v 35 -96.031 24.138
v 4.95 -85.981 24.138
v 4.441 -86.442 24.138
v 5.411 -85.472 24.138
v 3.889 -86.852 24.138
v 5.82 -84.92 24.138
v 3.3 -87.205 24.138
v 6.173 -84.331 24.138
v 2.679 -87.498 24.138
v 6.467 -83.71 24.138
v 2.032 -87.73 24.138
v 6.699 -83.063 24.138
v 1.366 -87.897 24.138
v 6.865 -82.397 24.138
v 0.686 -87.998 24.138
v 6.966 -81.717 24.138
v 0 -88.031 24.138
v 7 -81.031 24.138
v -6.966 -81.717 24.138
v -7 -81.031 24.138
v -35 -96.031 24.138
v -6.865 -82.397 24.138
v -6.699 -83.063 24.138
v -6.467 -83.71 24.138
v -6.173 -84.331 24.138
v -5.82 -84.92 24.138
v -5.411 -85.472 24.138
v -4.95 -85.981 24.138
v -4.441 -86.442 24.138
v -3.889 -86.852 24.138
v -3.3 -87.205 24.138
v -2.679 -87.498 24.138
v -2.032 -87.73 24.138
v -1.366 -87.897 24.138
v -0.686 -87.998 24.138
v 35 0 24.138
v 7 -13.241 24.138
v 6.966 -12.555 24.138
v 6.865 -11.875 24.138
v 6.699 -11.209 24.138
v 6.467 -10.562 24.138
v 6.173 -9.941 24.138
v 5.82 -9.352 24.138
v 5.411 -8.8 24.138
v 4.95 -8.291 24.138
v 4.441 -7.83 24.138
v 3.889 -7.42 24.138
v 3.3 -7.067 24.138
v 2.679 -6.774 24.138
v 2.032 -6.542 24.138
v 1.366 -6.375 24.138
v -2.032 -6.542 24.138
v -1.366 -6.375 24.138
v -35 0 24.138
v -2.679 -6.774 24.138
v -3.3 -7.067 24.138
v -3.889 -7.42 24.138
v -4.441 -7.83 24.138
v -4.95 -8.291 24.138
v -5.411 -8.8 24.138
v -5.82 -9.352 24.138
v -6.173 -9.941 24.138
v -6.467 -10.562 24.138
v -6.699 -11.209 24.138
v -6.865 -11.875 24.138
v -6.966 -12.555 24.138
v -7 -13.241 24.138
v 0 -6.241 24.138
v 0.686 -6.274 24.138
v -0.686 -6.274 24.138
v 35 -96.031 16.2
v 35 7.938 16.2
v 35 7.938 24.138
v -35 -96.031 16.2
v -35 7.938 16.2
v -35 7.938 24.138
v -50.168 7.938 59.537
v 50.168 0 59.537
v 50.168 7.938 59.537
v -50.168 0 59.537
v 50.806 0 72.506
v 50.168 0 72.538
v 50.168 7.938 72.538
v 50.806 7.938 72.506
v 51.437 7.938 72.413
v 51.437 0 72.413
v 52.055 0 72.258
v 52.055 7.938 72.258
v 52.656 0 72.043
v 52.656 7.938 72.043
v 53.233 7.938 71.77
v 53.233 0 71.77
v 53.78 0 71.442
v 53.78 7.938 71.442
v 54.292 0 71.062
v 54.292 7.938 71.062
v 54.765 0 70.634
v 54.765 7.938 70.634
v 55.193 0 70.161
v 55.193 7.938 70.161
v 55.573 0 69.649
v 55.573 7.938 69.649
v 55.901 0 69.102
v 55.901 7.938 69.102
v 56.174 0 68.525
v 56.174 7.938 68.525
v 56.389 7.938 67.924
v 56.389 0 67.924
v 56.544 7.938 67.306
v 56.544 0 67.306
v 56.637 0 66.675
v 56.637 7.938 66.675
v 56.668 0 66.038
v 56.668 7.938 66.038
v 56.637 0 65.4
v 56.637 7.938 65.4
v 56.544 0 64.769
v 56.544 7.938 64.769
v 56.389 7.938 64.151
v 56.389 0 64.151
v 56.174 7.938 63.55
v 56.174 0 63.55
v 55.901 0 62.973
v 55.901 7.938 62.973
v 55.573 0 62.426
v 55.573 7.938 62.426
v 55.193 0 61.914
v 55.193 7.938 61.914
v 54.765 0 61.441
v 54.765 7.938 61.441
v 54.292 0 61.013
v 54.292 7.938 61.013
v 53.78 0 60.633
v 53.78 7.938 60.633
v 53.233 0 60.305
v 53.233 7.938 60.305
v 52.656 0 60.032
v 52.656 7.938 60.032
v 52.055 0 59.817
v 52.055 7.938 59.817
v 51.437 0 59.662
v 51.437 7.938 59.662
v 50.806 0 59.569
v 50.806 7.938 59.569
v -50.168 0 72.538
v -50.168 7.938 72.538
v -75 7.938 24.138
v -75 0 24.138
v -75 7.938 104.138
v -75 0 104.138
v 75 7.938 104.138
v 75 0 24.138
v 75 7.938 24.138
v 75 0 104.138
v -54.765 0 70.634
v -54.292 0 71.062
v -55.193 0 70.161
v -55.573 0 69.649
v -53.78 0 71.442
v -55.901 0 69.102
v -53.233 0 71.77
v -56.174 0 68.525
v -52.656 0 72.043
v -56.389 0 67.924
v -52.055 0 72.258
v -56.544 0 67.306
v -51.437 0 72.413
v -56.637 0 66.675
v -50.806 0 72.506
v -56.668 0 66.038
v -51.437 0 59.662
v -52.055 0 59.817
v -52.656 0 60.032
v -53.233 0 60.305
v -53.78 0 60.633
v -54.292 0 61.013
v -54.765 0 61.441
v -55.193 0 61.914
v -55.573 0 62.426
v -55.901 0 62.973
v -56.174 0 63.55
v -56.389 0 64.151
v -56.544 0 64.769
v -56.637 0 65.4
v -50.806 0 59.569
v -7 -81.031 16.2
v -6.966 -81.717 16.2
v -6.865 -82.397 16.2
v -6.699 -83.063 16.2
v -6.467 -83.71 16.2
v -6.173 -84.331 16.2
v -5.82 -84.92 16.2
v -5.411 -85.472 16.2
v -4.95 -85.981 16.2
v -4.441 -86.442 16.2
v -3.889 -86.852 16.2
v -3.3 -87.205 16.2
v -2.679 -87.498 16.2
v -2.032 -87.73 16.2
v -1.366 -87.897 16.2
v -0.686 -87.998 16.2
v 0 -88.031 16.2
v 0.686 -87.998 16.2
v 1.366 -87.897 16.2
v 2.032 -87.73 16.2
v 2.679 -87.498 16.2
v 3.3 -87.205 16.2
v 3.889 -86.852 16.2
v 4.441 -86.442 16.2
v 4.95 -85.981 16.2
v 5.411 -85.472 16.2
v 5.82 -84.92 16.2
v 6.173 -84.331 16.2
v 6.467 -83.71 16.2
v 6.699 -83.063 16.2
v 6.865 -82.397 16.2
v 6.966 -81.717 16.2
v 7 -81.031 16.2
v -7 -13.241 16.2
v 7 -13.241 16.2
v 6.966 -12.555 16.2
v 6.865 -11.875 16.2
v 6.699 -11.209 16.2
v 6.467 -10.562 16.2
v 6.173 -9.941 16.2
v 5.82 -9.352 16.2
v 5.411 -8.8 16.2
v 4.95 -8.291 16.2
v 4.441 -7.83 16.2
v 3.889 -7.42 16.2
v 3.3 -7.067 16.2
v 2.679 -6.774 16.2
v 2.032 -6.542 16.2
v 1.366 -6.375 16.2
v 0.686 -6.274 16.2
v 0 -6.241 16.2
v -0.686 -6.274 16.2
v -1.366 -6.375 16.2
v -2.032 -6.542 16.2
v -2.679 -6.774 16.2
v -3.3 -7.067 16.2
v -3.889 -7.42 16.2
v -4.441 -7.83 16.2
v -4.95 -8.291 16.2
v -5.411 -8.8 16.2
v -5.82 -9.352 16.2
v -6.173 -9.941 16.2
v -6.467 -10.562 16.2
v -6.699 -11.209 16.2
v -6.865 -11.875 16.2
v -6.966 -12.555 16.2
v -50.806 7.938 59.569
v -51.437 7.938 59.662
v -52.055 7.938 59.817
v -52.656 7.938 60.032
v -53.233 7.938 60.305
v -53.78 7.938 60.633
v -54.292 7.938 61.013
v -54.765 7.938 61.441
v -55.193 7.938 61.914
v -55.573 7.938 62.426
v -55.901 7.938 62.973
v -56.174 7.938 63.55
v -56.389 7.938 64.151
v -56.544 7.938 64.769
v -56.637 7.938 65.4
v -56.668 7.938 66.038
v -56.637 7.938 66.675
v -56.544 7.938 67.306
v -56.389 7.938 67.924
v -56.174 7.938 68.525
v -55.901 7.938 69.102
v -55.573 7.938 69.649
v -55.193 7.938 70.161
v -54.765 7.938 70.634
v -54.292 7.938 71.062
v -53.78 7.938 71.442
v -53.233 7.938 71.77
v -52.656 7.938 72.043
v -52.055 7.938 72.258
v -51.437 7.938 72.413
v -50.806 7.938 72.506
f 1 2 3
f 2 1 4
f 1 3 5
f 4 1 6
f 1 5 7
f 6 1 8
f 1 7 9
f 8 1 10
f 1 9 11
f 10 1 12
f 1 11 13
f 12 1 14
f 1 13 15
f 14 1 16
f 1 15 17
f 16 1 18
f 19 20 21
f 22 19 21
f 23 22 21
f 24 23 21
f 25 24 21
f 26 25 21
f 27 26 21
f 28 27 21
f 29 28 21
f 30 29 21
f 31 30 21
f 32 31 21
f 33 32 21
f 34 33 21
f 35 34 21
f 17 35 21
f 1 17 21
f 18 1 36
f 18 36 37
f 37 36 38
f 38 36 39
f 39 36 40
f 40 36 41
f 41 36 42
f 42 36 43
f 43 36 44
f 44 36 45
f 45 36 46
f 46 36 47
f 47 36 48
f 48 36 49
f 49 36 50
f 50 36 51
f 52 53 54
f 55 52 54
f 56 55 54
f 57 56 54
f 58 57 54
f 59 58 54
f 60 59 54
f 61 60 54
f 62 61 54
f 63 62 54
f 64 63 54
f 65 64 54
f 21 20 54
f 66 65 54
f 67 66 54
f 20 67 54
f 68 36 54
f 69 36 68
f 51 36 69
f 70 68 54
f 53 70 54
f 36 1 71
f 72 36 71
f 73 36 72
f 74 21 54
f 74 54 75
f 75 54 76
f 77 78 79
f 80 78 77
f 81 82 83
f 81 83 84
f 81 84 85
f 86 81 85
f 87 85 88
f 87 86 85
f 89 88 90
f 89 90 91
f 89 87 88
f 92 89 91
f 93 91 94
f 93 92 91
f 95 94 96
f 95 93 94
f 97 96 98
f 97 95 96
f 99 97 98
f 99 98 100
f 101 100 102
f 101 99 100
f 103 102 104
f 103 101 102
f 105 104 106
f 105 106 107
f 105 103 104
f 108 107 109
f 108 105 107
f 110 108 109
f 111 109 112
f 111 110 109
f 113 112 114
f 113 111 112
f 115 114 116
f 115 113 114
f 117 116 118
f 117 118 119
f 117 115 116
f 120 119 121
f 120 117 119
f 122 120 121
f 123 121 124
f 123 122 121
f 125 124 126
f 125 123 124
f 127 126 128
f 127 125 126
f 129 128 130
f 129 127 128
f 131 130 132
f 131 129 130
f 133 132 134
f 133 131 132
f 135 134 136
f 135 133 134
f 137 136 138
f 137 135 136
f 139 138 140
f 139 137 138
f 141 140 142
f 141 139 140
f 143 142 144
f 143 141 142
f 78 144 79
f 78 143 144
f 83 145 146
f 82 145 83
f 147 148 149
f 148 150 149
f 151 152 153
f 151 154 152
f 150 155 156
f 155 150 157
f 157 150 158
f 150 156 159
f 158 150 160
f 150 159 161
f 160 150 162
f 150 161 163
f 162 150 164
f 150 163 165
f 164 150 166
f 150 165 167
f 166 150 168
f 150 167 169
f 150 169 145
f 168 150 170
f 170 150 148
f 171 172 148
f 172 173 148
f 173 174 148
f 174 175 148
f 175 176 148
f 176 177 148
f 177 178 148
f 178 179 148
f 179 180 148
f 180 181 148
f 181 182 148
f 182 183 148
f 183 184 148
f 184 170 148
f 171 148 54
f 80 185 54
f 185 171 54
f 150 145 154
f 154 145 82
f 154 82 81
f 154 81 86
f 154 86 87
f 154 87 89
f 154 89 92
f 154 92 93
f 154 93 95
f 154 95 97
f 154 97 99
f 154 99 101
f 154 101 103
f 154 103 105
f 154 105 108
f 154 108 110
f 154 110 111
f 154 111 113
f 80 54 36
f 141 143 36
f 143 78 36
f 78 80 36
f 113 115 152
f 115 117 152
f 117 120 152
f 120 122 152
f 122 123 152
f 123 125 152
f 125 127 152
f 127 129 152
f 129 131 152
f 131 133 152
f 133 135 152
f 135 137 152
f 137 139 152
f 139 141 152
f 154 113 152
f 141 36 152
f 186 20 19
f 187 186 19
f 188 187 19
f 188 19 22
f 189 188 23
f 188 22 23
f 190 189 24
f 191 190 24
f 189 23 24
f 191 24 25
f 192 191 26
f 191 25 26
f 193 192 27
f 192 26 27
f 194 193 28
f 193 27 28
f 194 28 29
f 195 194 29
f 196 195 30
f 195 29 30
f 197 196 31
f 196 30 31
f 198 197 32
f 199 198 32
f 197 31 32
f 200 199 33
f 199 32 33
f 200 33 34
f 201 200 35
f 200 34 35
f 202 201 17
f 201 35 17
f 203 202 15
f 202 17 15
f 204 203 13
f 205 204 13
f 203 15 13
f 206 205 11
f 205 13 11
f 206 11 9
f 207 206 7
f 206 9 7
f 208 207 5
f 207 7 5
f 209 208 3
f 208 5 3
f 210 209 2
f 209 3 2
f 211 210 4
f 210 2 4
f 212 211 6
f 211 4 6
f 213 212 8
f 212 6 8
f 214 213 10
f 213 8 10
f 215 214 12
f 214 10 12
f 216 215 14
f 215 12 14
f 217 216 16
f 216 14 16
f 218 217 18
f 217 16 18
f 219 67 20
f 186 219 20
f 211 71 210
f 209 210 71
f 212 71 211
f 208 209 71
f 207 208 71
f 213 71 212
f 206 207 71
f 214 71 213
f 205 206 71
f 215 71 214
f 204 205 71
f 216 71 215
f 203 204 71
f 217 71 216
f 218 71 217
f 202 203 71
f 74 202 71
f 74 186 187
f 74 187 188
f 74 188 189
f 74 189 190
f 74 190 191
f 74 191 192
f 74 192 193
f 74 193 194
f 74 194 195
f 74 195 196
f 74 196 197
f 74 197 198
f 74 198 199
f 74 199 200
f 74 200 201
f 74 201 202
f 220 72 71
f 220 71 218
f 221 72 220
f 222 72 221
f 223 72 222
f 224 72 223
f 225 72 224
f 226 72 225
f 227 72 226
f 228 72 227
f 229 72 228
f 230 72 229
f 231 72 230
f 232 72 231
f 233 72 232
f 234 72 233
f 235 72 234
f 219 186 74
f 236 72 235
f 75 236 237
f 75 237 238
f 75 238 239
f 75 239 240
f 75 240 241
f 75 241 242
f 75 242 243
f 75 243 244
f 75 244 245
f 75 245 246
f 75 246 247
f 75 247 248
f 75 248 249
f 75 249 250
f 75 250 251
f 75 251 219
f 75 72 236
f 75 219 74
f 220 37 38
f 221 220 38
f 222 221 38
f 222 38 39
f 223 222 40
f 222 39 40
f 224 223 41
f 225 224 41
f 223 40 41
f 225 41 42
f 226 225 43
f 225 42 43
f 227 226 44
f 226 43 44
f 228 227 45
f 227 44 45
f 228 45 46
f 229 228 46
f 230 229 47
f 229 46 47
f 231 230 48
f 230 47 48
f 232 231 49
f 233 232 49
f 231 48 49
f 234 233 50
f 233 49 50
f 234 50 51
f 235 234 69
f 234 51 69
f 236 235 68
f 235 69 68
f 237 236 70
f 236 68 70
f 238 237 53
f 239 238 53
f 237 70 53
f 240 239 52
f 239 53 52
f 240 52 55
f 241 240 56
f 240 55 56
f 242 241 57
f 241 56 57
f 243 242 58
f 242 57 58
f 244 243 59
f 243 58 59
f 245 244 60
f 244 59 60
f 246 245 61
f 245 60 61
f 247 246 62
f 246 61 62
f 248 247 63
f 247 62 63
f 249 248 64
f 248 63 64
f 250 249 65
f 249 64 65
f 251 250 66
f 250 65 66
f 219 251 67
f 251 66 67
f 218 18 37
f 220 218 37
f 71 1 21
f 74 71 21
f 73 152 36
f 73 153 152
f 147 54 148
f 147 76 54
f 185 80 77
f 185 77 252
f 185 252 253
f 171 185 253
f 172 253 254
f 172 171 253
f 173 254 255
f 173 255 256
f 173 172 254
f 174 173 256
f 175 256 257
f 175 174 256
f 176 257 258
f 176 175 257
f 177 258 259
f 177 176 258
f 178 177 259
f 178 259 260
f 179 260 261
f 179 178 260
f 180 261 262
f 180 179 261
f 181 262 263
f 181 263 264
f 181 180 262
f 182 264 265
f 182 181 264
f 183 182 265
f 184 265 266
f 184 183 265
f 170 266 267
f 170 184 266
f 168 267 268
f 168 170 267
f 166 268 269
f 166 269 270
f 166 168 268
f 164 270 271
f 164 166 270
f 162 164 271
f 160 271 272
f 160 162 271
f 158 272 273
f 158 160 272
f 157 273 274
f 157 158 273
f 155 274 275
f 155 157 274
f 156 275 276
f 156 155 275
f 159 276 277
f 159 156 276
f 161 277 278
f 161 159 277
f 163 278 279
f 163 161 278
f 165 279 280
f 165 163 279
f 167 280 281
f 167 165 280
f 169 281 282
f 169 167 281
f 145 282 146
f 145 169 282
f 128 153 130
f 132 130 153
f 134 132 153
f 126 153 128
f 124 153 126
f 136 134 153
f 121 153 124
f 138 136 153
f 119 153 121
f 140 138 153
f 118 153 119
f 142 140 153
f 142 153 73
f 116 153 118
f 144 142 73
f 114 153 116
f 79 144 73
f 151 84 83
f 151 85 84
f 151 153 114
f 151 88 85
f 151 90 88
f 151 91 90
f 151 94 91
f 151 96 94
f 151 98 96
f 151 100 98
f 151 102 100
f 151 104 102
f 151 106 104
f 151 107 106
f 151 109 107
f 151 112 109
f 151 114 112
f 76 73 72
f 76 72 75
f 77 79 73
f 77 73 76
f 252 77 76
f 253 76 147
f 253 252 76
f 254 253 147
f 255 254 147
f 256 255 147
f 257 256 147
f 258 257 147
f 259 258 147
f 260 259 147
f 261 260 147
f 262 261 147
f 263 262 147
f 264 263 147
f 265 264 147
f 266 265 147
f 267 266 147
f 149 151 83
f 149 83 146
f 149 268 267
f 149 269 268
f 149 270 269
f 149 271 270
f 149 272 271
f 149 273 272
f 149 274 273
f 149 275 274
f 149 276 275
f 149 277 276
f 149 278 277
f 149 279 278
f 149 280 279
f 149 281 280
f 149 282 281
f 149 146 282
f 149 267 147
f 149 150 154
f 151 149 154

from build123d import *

# Parameters (mm, degrees)
CROQUIS1_R                 = 6.35
CROQUIS1_R_2               = 6.26
CROQUIS1_R_3               = 6.25
SALIENTE_EXTRUIR1_DEPTH    = 7.9375
CROQUIS2_W                 = 150
CROQUIS2_H                 = 104.1375
SALIENTE_EXTRUIR2_DEPTH    = 7.9375
CONVERTIR_S_LIDO4_START    = -75
CONVERTIR_S_LIDO4_DEPTH    = 150
CONVERTIR_S_LIDO4_2_DEPTH  = 150
CORTAR_EXTRUIR4_DEPTH      = 369.571050011
CORTAR_EXTRUIR4_DEPTH_BACK = 369.571050011
CROQUIS4_W                 = 150
CROQUIS4_H                 = 11.2
CROQUIS7_W                 = 70
CROQUIS7_H                 = 96.03125
CROQUIS7_H_2               = 7.9375
SALIENTE_EXTRUIR3_DEPTH    = 7.9375


# Read off the part's stored shape, not the designer's step: Convertir-Sólido4
with BuildPart() as part:
    # Croquis1 → Saliente-Extruir1 (new body)
    with BuildSketch(Plane.XY):
        with BuildLine():
            Line((-75, 16), (-75, 0))
            Line((-75, 0), (75, 0))
            Line((75, 0), (75, 54))
            ThreePointArc((75, 54), (60.355339059, 89.355339059), (25, 104))
            Line((25, 104), (-200, 104))
            ThreePointArc((-200, 104), (-235.355339059, 89.355339059), (-250, 54))
            Line((-250, 54), (-250, 0))
            ThreePointArc((-250, 0), (0, -250), (250, 0))
            ThreePointArc((250, 0), (200, 50), (150, 0))
            ThreePointArc((150, 0), (0, -150), (-150, 0))
            Line((-150, 0), (-150, 16))
            Line((-150, 16), (-75, 16))
        make_face()
        with BuildLine():
            ThreePointArc((-49.374105038, 47.65), (-55.724105038, 54), (-49.374105038, 60.35))
            Line((-49.374105038, 60.35), (49.374105038, 60.35))
            ThreePointArc((49.374105038, 60.35), (55.724105038, 54), (49.374105038, 47.65))
            Line((49.374105038, 47.65), (-49.374105038, 47.65))
        make_face(mode=Mode.SUBTRACT)
        with Locations((193.418858597, -50.883643138)):
            Circle(CROQUIS1_R, mode=Mode.SUBTRACT)
        with Locations((200, 0)):
            Circle(CROQUIS1_R_2, mode=Mode.SUBTRACT)
        with Locations((-100, -173.205080757)):
            Circle(CROQUIS1_R_3, mode=Mode.SUBTRACT)
        with Locations((-50.883643138, -193.418858597)):
            Circle(CROQUIS1_R, mode=Mode.SUBTRACT)
        with Locations((-140.775956893, -142.063823547)):
            Circle(CROQUIS1_R, mode=Mode.SUBTRACT)
        with Locations((-173.205080757, -100)):
            Circle(CROQUIS1_R, mode=Mode.SUBTRACT)
        with Locations((0, -200)):
            Circle(CROQUIS1_R_3, mode=Mode.SUBTRACT)
        with Locations((52.642901704, -192.947466685)):
            Circle(CROQUIS1_R, mode=Mode.SUBTRACT)
        with Locations((100, -173.205080757)):
            Circle(CROQUIS1_R_3, mode=Mode.SUBTRACT)
        with Locations((142.063823547, -140.775956893)):
            Circle(CROQUIS1_R, mode=Mode.SUBTRACT)
        with Locations((173.205080757, -100)):
            Circle(CROQUIS1_R_3, mode=Mode.SUBTRACT)
        with Locations((-192.947466685, -52.642901704)):
            Circle(CROQUIS1_R, mode=Mode.SUBTRACT)
        with Locations((-200, 0)):
            Circle(CROQUIS1_R, mode=Mode.SUBTRACT)
        with Locations((-200, 54)):
            Circle(CROQUIS1_R, mode=Mode.SUBTRACT)
    extrude(amount=SALIENTE_EXTRUIR1_DEPTH)

    # Croquis2 → Saliente-Extruir2 (add)
    with BuildSketch(Plane.XZ):
        with Locations((0, 52.06875)):
            Rectangle(CROQUIS2_W, CROQUIS2_H)
        with BuildLine():
            Line((-50.16849794, 72.5375), (50.16849794, 72.5375))
            ThreePointArc((50.16849794, 72.5375), (56.66849794, 66.0375), (50.16849794, 59.5375))
            Line((50.16849794, 59.5375), (-50.16849794, 59.5375))
            ThreePointArc((-50.16849794, 59.5375), (-56.66849794, 66.0375), (-50.16849794, 72.5375))
        make_face(mode=Mode.SUBTRACT)
    extrude(amount=-SALIENTE_EXTRUIR2_DEPTH)

    # Convertir-Sólido4 outline → Convertir-Sólido4 (cut)
    with BuildSketch(Plane.YZ.offset(CONVERTIR_S_LIDO4_START)):
        with BuildLine():
            Line((0, 12.9375), (0, 0))
            Line((0, 0), (12.9375, 0))
            ThreePointArc((12.9375, 0), (3.789306018, 3.789306018), (0, 12.9375))
        make_face()
    extrude(amount=CONVERTIR_S_LIDO4_DEPTH, mode=Mode.SUBTRACT)

    # Convertir-S_lido4 2 outline → Convertir-S_lido4 2 (add)
    with BuildSketch(Plane.YZ.offset(CONVERTIR_S_LIDO4_START)):
        with BuildLine():
            Line((7.9375, 12.9375), (7.9375, 7.9375))
            Line((7.9375, 7.9375), (12.9375, 7.9375))
            ThreePointArc((12.9375, 7.9375), (9.401966094, 9.401966094), (7.9375, 12.9375))
        make_face()
    extrude(amount=CONVERTIR_S_LIDO4_2_DEPTH)

    # Croquis4 → Cortar-Extruir4 (cut, two sides: drawn at the far end of the back side and taken through both)
    with BuildSketch(Plane.XZ.offset(-CORTAR_EXTRUIR4_DEPTH_BACK)):
        Polygon((-75, 12.9375), (-75, 24.1375), (-279.933014074, 24.1375), (-279.933014074, -40.537488795), (278.241575923, -40.537488795), (278.241575923, 24.1375), (75, 24.1375), (75, 12.9375), align=None)
        with Locations((0, 18.5375)):
            Rectangle(CROQUIS4_W, CROQUIS4_H)
    extrude(amount=CORTAR_EXTRUIR4_DEPTH + CORTAR_EXTRUIR4_DEPTH_BACK, mode=Mode.SUBTRACT)

    # Croquis7 → Saliente-Extruir3 (add)
    # profile 1 of 2: a face of its own
    with BuildSketch(Plane(origin=(0, 0, 24.1375), x_dir=(-1, 0, 0), z_dir=(0, 0, -1))):
        with Locations((0, -48.015625)):
            Rectangle(CROQUIS7_W, CROQUIS7_H)
        with BuildLine():
            ThreePointArc((-7, -13.240738452), (0, -6.240738452), (7, -13.240738452))
            Line((7, -13.240738452), (7, -81.03125))
            ThreePointArc((7, -81.03125), (0, -88.03125), (-7, -81.03125))
            Line((-7, -81.03125), (-7, -13.240738452))
        make_face(mode=Mode.SUBTRACT)
    # profile 2 of 2: a face of its own
    with BuildSketch(Plane(origin=(0, 0, 24.1375), x_dir=(-1, 0, 0), z_dir=(0, 0, -1))):
        with Locations((0, 3.96875)):
            Rectangle(CROQUIS7_W, CROQUIS7_H_2)
    extrude(amount=SALIENTE_EXTRUIR3_DEPTH)


solid = part.part
